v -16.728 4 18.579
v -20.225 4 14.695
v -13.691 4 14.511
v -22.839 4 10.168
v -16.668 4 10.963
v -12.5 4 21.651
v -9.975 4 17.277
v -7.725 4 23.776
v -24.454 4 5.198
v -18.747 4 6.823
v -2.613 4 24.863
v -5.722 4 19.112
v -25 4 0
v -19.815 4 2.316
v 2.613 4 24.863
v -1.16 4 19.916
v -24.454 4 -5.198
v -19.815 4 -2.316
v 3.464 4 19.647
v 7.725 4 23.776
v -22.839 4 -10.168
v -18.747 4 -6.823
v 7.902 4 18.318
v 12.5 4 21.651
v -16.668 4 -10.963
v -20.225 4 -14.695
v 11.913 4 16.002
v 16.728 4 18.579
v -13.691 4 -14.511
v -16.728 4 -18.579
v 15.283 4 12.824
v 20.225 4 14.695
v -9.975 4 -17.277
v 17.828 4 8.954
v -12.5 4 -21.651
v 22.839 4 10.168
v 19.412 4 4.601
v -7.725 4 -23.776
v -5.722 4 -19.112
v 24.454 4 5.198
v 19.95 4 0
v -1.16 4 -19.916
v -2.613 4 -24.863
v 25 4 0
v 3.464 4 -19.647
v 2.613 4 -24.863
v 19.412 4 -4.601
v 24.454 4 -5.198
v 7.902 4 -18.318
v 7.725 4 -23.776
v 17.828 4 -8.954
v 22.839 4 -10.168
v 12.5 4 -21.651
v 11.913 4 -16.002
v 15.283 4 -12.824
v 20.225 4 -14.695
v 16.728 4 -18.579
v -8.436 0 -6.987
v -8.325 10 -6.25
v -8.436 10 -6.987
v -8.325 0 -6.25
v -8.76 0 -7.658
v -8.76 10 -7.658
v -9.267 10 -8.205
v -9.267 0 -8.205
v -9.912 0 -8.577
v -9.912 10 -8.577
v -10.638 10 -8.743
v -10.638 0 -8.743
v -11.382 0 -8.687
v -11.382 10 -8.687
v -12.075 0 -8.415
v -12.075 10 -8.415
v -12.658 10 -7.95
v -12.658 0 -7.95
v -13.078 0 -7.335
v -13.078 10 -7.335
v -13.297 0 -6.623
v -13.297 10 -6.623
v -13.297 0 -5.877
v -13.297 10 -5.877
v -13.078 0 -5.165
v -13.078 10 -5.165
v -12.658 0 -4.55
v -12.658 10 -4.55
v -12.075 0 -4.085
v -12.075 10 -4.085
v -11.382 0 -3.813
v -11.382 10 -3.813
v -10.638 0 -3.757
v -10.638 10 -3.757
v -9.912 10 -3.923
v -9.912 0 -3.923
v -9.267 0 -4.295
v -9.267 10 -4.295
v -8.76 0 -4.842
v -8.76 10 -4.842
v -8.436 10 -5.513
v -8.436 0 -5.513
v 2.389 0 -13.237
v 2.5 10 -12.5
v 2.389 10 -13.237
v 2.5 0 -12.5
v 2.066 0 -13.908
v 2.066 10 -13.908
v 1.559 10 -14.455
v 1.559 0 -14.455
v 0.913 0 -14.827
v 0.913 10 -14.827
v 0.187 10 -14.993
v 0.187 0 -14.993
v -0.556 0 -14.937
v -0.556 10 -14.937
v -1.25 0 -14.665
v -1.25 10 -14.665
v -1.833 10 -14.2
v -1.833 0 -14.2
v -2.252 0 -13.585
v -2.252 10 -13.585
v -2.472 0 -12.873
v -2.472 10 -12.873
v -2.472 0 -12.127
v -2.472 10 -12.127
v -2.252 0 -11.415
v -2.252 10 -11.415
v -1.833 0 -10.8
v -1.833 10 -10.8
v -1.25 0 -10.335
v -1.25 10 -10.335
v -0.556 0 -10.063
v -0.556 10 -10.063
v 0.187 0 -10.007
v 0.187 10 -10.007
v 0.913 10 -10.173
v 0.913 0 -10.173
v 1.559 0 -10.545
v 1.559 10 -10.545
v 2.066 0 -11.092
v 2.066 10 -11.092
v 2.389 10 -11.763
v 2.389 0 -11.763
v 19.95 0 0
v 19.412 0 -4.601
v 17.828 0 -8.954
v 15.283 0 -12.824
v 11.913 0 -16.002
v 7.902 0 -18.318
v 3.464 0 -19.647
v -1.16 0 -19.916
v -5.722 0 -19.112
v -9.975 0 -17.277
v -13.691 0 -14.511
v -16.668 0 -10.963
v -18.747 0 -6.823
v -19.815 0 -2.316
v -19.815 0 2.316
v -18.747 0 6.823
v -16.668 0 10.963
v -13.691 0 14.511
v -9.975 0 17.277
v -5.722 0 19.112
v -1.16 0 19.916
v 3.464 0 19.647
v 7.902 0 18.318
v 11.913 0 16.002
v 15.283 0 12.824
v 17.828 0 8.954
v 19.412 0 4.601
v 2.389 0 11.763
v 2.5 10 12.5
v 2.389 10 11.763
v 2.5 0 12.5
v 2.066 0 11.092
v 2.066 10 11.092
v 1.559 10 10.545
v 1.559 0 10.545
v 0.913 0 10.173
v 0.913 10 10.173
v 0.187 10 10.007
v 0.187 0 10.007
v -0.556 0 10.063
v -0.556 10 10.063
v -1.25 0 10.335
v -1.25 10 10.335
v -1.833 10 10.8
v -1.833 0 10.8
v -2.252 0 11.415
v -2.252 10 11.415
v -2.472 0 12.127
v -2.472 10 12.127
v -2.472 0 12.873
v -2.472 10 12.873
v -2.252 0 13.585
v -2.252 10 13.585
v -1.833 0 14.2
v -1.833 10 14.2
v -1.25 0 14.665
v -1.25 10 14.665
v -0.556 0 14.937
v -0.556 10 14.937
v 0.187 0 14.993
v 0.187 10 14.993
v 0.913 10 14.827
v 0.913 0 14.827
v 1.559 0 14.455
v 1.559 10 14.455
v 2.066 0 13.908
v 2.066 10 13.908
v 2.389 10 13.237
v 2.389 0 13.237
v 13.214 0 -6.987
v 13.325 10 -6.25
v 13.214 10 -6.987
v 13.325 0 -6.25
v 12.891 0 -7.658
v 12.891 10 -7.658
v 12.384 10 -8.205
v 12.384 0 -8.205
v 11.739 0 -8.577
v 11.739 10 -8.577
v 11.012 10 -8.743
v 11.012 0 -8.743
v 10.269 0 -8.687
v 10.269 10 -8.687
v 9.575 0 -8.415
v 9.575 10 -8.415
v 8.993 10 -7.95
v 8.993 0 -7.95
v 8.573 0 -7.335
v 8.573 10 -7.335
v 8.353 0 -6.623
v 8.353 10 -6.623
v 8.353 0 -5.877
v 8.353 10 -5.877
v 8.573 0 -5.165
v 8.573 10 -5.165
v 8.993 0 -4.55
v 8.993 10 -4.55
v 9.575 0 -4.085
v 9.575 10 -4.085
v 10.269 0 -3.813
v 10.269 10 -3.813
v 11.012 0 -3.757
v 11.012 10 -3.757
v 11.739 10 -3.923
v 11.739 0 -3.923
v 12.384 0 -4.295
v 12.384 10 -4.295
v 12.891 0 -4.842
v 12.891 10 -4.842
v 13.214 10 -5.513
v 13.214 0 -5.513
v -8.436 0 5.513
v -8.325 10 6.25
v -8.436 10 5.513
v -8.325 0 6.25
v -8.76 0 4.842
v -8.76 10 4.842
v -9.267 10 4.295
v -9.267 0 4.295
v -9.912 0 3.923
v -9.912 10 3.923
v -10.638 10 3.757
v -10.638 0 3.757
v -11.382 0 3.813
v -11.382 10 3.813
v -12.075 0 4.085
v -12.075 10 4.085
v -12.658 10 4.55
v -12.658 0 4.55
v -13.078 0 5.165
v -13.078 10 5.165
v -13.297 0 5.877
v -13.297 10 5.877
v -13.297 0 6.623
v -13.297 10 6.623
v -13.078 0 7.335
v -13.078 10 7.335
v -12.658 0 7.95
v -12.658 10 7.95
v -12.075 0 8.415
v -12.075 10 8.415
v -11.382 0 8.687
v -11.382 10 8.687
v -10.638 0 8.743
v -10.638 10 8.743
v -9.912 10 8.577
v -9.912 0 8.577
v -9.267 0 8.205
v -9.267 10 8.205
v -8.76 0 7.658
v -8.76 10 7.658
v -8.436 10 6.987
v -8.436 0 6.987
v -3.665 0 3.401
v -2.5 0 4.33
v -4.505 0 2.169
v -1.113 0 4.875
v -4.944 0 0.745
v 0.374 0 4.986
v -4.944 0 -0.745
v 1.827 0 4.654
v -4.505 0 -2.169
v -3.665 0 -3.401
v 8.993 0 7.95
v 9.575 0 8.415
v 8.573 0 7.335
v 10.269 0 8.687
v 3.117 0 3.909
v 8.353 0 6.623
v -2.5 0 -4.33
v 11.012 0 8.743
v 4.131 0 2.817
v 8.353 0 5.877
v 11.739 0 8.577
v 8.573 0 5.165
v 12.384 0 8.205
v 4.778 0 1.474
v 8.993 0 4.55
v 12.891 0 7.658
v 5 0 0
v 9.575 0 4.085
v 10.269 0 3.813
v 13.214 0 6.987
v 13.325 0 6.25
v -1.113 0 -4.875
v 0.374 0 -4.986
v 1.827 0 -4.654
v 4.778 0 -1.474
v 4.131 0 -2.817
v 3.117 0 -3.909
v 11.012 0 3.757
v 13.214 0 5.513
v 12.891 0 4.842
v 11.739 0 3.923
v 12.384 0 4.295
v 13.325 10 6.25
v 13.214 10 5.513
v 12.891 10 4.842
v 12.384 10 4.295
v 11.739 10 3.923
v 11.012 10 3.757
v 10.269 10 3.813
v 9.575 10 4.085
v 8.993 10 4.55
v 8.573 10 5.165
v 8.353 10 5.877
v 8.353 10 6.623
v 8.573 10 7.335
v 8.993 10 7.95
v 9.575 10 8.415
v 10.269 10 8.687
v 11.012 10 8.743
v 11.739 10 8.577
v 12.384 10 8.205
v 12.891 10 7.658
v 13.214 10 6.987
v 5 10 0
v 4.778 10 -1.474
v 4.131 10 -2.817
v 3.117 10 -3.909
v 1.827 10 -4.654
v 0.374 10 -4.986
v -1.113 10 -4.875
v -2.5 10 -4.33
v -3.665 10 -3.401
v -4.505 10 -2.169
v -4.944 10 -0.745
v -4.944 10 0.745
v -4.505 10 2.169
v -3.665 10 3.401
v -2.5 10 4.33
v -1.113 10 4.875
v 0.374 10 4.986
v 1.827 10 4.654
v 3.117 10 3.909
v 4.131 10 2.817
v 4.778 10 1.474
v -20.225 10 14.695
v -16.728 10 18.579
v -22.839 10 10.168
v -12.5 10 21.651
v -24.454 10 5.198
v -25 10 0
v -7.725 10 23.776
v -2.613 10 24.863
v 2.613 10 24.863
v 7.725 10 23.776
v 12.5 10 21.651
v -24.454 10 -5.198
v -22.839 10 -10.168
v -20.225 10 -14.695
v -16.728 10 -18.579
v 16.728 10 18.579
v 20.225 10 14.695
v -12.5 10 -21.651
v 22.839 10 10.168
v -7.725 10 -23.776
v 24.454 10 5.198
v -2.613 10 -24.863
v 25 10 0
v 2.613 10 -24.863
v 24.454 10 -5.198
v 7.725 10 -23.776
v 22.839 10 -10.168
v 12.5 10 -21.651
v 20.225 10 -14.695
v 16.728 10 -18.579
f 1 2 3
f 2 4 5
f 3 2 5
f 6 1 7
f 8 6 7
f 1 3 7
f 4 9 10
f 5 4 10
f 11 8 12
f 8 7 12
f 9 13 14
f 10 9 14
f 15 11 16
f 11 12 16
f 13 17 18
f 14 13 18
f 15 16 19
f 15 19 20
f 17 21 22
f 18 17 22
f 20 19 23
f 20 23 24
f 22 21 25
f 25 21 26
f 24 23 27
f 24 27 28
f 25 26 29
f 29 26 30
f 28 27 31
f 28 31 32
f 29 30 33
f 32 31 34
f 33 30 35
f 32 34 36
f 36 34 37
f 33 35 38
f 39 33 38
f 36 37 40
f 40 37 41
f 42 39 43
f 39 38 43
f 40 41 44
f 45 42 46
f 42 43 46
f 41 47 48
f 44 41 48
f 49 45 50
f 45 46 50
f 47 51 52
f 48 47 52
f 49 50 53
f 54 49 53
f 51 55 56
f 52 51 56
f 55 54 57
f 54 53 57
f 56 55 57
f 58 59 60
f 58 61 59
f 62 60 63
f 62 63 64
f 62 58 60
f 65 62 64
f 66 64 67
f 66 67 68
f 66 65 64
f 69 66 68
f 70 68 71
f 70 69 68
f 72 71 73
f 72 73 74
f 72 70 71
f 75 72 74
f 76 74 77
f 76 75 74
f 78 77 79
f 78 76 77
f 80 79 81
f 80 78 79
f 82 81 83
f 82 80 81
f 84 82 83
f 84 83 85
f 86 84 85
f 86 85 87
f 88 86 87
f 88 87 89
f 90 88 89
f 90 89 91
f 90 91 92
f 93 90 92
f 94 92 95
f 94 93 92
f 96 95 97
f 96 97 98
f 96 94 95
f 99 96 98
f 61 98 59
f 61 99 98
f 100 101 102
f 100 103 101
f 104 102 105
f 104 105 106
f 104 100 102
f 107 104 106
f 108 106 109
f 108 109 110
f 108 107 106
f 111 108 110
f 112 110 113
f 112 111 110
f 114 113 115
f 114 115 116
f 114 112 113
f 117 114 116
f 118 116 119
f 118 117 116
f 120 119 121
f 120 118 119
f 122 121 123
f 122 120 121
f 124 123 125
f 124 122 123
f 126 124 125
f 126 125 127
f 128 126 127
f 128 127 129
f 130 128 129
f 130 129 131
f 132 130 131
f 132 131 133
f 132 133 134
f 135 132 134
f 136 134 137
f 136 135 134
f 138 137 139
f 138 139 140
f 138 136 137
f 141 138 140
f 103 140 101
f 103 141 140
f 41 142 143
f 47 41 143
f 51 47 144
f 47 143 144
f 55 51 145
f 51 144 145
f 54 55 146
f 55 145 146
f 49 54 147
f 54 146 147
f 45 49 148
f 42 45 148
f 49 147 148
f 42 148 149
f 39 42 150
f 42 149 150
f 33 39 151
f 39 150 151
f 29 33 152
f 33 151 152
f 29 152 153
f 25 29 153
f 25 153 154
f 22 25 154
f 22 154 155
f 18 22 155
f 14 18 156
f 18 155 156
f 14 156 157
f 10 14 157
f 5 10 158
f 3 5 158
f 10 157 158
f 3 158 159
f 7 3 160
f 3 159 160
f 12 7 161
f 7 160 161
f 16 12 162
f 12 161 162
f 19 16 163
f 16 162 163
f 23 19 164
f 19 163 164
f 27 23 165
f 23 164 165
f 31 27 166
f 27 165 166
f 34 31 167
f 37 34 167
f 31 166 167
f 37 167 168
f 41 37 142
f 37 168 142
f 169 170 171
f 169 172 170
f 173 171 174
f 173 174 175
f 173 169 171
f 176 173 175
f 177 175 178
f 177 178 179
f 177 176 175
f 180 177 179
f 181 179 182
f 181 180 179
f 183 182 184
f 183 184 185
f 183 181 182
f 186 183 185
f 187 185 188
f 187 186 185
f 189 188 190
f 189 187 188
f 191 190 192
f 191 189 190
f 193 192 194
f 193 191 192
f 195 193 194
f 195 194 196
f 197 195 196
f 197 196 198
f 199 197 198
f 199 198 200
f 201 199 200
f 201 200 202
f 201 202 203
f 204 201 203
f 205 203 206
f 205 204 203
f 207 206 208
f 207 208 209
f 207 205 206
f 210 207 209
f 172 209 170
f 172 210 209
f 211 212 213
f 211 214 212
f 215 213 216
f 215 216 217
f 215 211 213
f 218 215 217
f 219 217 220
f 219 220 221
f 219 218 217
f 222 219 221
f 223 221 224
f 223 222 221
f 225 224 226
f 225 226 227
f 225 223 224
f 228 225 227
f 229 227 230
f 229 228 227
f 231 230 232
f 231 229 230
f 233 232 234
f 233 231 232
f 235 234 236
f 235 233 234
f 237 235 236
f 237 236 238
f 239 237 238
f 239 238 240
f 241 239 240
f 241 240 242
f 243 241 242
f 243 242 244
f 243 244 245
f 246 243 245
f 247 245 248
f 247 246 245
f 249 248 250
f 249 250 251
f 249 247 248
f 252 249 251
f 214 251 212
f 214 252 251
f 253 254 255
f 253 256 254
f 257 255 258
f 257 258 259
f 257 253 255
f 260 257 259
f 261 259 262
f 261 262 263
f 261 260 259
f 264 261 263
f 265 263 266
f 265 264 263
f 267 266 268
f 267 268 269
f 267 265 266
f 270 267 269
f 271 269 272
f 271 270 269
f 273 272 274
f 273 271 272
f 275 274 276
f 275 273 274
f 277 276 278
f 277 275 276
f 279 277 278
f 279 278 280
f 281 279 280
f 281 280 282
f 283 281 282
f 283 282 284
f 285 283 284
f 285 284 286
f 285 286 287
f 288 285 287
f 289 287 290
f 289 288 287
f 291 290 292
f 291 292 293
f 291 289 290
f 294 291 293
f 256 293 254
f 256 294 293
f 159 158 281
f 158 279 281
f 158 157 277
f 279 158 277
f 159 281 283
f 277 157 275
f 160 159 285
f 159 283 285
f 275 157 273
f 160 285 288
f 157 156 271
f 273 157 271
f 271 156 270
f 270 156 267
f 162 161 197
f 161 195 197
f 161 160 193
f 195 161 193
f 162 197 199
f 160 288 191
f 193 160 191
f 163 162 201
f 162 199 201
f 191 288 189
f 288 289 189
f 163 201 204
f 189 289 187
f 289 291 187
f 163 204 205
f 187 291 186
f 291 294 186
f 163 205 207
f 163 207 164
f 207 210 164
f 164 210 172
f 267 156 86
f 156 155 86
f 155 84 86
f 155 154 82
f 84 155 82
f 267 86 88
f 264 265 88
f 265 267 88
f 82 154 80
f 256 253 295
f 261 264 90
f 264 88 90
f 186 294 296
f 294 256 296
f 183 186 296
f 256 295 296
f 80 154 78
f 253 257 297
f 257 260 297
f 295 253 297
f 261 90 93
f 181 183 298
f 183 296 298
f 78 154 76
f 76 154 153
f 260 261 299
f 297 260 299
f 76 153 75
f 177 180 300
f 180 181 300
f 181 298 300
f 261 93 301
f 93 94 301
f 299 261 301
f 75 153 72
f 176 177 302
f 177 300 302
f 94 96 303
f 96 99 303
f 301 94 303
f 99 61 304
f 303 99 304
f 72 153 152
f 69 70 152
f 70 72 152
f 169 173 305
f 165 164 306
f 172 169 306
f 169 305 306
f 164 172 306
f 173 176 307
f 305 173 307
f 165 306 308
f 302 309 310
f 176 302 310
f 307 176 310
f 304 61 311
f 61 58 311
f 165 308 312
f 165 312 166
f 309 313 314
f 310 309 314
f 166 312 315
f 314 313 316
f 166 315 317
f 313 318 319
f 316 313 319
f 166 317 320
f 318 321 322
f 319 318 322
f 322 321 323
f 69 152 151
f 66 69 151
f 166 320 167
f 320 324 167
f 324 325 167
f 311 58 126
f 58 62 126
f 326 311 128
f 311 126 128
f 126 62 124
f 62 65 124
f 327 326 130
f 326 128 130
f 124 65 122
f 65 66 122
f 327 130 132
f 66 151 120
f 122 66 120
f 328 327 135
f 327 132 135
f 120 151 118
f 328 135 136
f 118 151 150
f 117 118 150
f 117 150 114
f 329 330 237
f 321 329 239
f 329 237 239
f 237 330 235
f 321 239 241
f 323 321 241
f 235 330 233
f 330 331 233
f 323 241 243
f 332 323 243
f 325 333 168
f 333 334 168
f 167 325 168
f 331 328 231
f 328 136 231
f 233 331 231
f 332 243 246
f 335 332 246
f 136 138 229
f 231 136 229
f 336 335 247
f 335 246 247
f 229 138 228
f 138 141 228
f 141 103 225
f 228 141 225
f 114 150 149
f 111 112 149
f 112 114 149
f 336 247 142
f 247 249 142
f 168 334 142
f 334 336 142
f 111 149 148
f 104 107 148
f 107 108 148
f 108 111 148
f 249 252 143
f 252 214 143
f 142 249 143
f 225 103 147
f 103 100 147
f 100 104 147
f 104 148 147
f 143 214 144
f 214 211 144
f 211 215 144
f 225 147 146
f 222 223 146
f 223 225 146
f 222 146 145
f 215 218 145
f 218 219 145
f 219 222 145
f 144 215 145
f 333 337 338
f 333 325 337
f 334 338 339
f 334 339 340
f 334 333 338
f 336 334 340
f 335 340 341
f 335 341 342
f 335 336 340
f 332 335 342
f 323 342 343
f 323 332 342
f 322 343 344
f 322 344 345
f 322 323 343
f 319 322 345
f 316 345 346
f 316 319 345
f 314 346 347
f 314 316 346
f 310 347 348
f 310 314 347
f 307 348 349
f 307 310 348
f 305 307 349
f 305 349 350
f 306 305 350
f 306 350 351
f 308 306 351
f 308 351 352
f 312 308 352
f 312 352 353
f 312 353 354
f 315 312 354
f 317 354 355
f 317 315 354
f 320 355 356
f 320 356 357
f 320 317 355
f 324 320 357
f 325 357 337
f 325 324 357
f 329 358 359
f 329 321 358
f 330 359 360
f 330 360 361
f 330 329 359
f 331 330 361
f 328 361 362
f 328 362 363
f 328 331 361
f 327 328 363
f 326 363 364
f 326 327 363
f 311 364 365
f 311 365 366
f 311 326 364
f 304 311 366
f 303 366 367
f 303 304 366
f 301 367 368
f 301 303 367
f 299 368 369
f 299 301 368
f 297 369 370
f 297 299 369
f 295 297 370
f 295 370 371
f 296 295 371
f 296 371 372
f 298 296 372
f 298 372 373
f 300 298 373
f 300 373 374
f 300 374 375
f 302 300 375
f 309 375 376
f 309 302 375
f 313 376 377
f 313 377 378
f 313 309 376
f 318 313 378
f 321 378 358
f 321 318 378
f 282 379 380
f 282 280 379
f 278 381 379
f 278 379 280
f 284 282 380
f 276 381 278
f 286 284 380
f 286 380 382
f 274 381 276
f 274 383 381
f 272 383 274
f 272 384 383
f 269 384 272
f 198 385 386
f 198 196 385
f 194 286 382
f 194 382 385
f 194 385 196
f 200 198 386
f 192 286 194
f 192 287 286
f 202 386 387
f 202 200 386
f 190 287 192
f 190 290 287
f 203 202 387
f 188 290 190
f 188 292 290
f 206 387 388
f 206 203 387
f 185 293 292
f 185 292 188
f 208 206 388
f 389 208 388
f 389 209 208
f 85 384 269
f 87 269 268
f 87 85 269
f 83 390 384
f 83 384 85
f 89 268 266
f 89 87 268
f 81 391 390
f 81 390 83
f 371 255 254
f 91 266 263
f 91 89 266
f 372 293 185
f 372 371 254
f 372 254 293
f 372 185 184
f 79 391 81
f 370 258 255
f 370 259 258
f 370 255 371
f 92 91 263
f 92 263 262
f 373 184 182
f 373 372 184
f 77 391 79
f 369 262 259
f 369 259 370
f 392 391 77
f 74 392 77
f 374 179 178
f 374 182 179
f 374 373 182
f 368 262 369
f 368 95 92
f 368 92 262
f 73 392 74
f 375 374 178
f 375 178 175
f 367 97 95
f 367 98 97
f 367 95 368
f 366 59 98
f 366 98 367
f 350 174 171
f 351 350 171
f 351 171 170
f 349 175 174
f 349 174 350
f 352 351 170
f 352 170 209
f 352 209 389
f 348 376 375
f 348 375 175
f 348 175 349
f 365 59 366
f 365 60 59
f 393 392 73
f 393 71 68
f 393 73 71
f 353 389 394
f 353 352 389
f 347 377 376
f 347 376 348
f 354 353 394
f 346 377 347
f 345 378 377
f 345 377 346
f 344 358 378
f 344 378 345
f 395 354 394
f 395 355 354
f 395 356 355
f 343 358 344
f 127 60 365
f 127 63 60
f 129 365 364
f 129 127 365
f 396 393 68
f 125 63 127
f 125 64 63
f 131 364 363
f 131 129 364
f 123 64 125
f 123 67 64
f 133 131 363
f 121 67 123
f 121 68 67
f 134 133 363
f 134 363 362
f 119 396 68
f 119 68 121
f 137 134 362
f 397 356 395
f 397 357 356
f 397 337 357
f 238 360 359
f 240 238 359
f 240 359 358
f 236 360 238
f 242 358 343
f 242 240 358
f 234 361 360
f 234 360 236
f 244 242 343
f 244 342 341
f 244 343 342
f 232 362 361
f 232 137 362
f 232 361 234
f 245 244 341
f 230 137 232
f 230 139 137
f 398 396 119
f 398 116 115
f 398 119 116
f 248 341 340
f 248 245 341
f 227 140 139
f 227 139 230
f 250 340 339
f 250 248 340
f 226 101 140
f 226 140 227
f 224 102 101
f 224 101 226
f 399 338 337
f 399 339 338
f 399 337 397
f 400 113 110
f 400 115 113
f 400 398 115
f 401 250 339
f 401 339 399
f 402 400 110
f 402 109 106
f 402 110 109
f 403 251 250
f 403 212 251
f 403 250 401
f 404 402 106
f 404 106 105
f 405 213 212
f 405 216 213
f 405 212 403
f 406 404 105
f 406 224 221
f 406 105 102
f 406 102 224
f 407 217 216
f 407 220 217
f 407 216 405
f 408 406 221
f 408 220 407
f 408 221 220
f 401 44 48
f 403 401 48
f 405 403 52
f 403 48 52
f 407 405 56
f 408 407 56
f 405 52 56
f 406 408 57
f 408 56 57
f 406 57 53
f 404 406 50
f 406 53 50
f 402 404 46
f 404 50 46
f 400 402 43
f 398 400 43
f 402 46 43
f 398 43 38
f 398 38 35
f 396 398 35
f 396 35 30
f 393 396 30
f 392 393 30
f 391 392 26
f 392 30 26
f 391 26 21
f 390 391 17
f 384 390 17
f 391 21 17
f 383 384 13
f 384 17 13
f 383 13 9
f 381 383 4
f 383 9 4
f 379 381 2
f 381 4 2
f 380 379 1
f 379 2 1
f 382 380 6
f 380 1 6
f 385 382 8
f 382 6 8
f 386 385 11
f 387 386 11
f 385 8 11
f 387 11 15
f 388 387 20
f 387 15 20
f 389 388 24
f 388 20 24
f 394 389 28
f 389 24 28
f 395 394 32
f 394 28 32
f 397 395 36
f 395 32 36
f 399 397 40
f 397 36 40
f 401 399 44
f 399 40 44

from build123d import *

# Parameters (mm, degrees)
ESQUISSE1_R        = 19.95
ESQUISSE1_R_2      = 5
ESQUISSE1_R_3      = 2.5
BOSS_EXTRU_1_DEPTH = 4
ESQUISSE2_R        = 25
ESQUISSE2_R_2      = 2.5
ESQUISSE2_R_3      = 5
BOSS_EXTRU_2_DEPTH = 6


with BuildPart() as part:
    # Esquisse1 → Boss.-Extru.1 (new body)
    with BuildSketch(Plane(origin=(0, 0, 0), x_dir=(1, 0, 0), z_dir=(0, 1, 0))):
        Circle(ESQUISSE1_R)
        Circle(ESQUISSE1_R_2, mode=Mode.SUBTRACT)
        with Locations((0, 12.5)):
            Circle(ESQUISSE1_R_3, mode=Mode.SUBTRACT)
        with Locations((10.825317547, 6.25)):
            Circle(ESQUISSE1_R_3, mode=Mode.SUBTRACT)
        with Locations((10.825317547, -6.25)):
            Circle(ESQUISSE1_R_3, mode=Mode.SUBTRACT)
        with Locations((0, -12.5)):
            Circle(ESQUISSE1_R_3, mode=Mode.SUBTRACT)
        with Locations((-10.825317547, -6.25)):
            Circle(ESQUISSE1_R_3, mode=Mode.SUBTRACT)
        with Locations((-10.825317547, 6.25)):
            Circle(ESQUISSE1_R_3, mode=Mode.SUBTRACT)
    extrude(amount=BOSS_EXTRU_1_DEPTH)

    # Esquisse2 → Boss.-Extru.2 (add)
    with BuildSketch(Plane(origin=(0, 4, 0), x_dir=(1, 0, 0), z_dir=(0, 1, 0))):
        Circle(ESQUISSE2_R)
        with Locations((0, 12.5)):
            Circle(ESQUISSE2_R_2, mode=Mode.SUBTRACT)
        with Locations((10.825317547, 6.25)):
            Circle(ESQUISSE2_R_2, mode=Mode.SUBTRACT)
        with Locations((10.825317547, -6.25)):
            Circle(ESQUISSE2_R_2, mode=Mode.SUBTRACT)
        Circle(ESQUISSE2_R_3, mode=Mode.SUBTRACT)
        with Locations((0, -12.5)):
            Circle(ESQUISSE2_R_2, mode=Mode.SUBTRACT)
        with Locations((-10.825317547, -6.25)):
            Circle(ESQUISSE2_R_2, mode=Mode.SUBTRACT)
        with Locations((-10.825317547, 6.25)):
            Circle(ESQUISSE2_R_2, mode=Mode.SUBTRACT)
    extrude(amount=BOSS_EXTRU_2_DEPTH)


solid = part.part
